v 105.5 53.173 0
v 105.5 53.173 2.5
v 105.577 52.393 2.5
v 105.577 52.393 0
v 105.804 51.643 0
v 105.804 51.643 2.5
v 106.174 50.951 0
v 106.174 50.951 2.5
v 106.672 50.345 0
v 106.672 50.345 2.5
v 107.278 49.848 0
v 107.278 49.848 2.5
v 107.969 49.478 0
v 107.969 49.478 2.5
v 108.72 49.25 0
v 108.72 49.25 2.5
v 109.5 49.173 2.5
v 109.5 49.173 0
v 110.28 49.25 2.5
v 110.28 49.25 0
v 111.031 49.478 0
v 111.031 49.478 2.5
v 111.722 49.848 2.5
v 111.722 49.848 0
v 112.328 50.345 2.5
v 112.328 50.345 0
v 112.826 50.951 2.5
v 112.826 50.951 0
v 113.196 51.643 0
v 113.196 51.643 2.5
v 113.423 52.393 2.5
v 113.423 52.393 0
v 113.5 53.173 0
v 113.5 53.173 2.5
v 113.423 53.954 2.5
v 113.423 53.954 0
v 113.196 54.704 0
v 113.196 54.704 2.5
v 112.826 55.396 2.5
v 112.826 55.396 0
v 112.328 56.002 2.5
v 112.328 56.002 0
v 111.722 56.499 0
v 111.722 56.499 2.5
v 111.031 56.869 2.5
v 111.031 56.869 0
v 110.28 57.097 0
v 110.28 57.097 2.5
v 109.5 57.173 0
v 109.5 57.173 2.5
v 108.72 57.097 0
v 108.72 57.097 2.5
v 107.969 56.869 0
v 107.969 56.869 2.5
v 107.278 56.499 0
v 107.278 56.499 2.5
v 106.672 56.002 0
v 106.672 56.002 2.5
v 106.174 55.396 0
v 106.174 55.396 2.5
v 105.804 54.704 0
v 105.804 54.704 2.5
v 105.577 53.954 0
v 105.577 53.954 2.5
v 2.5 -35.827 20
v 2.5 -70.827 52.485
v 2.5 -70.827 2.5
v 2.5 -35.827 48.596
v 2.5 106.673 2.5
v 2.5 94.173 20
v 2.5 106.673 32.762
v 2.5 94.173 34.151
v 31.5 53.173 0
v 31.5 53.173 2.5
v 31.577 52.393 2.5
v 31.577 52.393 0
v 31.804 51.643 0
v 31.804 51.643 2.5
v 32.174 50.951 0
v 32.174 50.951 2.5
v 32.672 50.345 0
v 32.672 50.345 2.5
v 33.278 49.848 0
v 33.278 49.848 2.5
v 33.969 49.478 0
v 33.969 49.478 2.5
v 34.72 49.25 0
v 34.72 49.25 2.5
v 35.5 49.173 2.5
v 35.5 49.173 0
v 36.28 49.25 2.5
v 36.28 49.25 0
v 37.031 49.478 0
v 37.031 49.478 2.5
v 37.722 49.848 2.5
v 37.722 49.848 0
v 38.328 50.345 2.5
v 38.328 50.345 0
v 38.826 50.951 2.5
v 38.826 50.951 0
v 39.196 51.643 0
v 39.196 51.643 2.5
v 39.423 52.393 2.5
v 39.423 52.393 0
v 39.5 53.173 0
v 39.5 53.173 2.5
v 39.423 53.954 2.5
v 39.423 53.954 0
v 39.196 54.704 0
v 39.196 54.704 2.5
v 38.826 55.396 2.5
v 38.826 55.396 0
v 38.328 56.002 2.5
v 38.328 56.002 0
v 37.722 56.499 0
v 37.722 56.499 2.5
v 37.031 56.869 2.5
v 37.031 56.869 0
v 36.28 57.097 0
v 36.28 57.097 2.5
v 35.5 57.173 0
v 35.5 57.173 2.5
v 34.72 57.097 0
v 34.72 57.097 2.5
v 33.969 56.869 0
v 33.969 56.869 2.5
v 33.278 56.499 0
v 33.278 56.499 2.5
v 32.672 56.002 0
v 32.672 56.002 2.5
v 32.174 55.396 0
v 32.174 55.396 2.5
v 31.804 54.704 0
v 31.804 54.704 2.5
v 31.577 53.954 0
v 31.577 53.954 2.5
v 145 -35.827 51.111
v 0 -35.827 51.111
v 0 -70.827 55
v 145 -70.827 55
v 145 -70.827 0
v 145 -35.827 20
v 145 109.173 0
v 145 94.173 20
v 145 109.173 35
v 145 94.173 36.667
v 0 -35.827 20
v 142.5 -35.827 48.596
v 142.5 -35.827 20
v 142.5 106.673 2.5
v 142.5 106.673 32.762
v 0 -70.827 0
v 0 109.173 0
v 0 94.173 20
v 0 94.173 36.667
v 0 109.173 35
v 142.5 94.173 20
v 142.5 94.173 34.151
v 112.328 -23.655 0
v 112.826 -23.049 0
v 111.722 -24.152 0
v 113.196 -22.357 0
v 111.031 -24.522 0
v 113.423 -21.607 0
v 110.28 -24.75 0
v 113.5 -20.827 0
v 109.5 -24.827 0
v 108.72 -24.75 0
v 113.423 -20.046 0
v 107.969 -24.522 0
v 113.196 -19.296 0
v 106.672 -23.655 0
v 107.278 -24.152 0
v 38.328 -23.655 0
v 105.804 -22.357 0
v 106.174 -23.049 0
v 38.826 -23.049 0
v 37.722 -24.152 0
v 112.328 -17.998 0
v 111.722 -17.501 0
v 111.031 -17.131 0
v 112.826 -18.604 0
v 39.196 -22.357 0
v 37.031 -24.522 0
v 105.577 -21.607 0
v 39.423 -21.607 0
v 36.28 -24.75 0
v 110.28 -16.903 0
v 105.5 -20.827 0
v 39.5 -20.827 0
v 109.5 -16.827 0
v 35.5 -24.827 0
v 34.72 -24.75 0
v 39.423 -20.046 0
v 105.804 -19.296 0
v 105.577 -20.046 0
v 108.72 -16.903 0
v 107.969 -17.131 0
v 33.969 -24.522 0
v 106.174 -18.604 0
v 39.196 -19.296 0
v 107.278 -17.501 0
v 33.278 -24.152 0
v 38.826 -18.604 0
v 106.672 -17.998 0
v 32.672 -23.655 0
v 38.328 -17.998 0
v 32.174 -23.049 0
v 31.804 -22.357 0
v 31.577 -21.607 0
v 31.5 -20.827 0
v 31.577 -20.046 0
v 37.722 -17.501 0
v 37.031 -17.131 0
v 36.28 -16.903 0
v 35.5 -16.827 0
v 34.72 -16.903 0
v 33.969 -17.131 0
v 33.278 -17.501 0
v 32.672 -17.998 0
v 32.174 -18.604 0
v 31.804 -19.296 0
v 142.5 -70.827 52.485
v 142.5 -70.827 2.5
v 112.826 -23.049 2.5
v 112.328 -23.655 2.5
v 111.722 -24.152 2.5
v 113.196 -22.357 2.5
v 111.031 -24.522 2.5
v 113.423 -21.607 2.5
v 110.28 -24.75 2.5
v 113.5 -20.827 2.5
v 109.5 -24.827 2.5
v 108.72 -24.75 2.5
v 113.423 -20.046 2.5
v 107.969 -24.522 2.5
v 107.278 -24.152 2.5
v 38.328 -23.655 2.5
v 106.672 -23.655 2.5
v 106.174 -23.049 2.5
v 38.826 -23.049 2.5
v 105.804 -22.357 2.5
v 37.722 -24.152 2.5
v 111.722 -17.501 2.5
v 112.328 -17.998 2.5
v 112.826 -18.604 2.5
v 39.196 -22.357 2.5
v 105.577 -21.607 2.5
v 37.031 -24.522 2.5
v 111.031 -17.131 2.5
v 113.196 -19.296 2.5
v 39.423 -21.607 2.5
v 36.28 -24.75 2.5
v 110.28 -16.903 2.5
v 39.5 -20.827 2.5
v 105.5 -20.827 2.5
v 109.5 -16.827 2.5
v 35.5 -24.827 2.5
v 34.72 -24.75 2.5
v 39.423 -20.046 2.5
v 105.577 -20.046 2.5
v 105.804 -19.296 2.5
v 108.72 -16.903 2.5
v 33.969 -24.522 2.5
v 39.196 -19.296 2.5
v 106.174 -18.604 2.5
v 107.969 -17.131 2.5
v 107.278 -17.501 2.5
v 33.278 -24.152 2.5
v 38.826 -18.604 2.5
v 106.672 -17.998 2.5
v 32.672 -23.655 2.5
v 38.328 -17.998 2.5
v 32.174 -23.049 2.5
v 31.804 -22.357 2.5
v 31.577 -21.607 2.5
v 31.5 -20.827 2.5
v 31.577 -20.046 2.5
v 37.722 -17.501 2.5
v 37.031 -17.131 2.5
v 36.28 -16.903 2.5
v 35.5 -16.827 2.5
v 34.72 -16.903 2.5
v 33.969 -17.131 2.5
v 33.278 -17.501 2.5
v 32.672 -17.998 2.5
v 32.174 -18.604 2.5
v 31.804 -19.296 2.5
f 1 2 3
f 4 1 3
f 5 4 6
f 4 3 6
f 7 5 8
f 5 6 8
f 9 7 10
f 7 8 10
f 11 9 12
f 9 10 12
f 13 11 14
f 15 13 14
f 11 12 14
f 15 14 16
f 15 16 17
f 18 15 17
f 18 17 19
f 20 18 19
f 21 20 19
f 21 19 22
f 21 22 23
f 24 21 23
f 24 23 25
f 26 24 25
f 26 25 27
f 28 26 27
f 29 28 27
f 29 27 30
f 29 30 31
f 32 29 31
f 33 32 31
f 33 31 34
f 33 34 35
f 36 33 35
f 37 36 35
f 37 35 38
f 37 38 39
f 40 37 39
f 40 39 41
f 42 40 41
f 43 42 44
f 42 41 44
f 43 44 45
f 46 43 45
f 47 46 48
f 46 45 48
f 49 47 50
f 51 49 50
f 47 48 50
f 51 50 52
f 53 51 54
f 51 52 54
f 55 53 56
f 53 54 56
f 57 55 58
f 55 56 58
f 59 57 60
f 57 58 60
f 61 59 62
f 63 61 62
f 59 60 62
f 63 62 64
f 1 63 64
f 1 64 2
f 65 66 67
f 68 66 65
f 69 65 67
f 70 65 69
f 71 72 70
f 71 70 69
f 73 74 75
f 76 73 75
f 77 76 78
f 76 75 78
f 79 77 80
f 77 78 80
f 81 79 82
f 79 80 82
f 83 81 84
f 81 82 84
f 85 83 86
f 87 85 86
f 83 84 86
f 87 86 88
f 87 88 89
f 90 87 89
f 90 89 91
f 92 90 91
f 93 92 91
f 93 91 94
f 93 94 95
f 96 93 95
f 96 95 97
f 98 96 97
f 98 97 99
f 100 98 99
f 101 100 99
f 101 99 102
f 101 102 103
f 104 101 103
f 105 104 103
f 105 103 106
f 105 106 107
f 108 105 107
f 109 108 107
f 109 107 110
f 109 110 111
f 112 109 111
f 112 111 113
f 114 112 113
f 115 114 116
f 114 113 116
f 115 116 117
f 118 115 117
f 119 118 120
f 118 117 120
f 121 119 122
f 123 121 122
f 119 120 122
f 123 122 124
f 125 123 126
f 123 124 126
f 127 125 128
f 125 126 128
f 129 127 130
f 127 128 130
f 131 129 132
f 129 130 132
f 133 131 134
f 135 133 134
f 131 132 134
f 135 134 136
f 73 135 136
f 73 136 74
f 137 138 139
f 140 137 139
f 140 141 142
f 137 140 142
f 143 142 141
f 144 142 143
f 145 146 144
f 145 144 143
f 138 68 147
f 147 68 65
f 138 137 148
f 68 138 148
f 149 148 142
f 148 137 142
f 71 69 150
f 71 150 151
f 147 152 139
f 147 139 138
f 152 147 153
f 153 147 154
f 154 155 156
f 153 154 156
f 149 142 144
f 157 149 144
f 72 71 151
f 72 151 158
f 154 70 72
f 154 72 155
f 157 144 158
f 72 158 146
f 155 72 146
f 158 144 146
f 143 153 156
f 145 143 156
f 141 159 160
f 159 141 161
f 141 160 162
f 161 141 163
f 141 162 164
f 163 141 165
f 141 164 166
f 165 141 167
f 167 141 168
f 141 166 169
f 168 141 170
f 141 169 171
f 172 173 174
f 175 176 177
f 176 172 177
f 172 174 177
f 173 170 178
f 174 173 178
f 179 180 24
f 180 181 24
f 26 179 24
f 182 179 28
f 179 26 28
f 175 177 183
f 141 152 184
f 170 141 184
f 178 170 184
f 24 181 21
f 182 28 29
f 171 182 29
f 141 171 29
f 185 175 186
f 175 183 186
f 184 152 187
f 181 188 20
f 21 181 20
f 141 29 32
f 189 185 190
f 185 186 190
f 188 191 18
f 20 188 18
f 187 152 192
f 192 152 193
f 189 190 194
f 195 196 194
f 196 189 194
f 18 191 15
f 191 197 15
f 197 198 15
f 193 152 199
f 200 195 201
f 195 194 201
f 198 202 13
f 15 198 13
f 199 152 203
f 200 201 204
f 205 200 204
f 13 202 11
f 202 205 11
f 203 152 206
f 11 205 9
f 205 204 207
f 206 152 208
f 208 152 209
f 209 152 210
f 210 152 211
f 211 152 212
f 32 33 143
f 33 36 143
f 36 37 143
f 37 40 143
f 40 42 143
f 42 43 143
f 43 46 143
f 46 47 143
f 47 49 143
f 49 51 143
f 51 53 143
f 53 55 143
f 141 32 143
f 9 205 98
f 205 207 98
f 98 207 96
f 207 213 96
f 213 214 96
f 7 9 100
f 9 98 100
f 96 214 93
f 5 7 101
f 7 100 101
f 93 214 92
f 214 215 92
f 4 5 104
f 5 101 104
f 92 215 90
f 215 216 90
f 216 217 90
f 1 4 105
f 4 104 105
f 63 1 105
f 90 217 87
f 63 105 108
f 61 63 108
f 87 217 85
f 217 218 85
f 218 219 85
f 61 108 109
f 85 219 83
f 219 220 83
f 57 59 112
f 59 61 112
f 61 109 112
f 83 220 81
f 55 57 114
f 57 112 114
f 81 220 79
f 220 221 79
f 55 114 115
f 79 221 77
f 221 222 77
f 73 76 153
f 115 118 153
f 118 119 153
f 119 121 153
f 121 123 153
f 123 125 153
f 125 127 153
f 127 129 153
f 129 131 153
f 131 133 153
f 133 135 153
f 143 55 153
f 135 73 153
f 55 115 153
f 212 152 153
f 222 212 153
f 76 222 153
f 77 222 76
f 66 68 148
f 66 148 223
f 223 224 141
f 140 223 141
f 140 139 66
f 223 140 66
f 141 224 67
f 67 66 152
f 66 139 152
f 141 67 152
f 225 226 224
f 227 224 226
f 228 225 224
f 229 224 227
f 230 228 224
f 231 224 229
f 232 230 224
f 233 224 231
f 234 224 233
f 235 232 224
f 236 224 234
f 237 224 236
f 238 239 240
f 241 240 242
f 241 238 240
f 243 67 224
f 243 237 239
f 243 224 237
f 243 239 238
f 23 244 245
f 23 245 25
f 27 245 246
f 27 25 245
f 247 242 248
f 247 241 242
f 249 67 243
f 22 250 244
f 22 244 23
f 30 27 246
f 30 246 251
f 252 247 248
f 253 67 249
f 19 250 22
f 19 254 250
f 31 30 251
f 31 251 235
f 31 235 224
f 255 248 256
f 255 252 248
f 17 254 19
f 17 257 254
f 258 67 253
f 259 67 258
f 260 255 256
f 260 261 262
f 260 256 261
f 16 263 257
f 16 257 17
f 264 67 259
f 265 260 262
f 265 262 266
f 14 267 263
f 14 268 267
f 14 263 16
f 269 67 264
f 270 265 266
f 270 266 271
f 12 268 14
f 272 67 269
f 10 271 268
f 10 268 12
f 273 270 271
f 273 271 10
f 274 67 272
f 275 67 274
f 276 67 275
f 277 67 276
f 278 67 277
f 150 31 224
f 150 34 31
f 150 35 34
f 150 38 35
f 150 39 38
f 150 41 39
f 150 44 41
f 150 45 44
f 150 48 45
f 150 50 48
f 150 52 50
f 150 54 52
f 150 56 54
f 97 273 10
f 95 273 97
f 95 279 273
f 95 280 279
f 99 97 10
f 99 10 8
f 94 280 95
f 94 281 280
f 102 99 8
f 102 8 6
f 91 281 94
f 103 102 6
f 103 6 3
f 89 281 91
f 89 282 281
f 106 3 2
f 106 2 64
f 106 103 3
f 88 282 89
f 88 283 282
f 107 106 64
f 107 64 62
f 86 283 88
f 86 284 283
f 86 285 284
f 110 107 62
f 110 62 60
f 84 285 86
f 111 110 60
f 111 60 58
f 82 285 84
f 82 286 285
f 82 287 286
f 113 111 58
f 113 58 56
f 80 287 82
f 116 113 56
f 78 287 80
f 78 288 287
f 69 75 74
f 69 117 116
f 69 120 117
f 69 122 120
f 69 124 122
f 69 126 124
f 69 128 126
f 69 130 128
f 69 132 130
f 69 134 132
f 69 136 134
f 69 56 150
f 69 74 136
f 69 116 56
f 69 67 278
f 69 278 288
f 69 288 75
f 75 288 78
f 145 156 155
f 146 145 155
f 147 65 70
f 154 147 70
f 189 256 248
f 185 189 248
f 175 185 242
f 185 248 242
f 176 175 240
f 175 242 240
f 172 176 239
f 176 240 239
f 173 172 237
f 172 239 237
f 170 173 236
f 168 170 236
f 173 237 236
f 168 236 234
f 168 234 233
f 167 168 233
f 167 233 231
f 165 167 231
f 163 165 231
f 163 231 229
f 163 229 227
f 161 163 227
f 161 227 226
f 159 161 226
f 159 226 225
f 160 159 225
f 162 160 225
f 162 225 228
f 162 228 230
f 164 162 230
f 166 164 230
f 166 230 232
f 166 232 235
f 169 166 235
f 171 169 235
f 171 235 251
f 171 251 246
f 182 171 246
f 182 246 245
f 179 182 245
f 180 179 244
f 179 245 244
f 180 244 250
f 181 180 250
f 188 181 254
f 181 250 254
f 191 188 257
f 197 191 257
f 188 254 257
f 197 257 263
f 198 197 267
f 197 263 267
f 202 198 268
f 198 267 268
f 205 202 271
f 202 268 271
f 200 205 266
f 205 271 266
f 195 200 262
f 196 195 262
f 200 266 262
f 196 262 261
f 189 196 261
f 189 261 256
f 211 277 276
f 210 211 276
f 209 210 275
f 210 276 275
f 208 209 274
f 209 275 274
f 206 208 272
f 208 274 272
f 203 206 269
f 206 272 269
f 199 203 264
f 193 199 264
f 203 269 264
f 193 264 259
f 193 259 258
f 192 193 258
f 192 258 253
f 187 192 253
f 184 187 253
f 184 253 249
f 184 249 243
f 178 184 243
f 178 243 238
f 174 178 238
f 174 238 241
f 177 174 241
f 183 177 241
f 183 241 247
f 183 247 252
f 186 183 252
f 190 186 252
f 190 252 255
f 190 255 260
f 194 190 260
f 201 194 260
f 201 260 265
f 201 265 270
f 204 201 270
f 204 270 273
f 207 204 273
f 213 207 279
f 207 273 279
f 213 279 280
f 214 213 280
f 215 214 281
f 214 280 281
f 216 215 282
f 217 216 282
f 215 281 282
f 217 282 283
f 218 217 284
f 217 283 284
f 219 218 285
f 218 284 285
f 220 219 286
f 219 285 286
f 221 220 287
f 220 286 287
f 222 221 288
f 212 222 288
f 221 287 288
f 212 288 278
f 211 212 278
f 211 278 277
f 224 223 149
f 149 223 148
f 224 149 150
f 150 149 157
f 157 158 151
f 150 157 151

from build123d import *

# Parameters (mm, degrees)
F1_DEPTH = 145
F2_T     = -2.5
F4_DEPTH = 145
F6_D     = 8


# Not quite as in the source:
# - a feature names something its author has since deleted; it is built from what else it names


with BuildPart() as f1:
    # F0 (on Right) → F1 (new body)
    with BuildSketch(Plane.YZ):
        Polygon((109.173472161, 35), (-70.826527839, 55), (-70.826527839, 0), (109.173472161, 0), align=None)
    extrude(amount=F1_DEPTH)

    # F2
    f2_openings = [f1.faces().sort_by_distance(p)[0] for p in [
        (72.5, -70.826528, 27.5),
    ]]
    offset(amount=F2_T, openings=f2_openings)

    # F3 (on face) → F4 (cut)
    with BuildSketch(Plane.YZ.offset(145)):
        Polygon((94.173472161, 36.6666666667), (-35.826527839, 51.1111111111), (-35.826527839, 20), (94.173472161, 20), align=None)
    extrude(amount=-F4_DEPTH, mode=Mode.SUBTRACT)

    # F6 (through all)
    with Locations(Plane(origin=(0, 0, 0), x_dir=(1, 0, 0), z_dir=(0, 0, -1))):
        with Locations((109.5, 20.826527839), (35.5, 20.826527839), (35.5, -53.173472161), (109.5, -53.173472161)):
            Hole(F6_D / 2)


solid = f1.part
